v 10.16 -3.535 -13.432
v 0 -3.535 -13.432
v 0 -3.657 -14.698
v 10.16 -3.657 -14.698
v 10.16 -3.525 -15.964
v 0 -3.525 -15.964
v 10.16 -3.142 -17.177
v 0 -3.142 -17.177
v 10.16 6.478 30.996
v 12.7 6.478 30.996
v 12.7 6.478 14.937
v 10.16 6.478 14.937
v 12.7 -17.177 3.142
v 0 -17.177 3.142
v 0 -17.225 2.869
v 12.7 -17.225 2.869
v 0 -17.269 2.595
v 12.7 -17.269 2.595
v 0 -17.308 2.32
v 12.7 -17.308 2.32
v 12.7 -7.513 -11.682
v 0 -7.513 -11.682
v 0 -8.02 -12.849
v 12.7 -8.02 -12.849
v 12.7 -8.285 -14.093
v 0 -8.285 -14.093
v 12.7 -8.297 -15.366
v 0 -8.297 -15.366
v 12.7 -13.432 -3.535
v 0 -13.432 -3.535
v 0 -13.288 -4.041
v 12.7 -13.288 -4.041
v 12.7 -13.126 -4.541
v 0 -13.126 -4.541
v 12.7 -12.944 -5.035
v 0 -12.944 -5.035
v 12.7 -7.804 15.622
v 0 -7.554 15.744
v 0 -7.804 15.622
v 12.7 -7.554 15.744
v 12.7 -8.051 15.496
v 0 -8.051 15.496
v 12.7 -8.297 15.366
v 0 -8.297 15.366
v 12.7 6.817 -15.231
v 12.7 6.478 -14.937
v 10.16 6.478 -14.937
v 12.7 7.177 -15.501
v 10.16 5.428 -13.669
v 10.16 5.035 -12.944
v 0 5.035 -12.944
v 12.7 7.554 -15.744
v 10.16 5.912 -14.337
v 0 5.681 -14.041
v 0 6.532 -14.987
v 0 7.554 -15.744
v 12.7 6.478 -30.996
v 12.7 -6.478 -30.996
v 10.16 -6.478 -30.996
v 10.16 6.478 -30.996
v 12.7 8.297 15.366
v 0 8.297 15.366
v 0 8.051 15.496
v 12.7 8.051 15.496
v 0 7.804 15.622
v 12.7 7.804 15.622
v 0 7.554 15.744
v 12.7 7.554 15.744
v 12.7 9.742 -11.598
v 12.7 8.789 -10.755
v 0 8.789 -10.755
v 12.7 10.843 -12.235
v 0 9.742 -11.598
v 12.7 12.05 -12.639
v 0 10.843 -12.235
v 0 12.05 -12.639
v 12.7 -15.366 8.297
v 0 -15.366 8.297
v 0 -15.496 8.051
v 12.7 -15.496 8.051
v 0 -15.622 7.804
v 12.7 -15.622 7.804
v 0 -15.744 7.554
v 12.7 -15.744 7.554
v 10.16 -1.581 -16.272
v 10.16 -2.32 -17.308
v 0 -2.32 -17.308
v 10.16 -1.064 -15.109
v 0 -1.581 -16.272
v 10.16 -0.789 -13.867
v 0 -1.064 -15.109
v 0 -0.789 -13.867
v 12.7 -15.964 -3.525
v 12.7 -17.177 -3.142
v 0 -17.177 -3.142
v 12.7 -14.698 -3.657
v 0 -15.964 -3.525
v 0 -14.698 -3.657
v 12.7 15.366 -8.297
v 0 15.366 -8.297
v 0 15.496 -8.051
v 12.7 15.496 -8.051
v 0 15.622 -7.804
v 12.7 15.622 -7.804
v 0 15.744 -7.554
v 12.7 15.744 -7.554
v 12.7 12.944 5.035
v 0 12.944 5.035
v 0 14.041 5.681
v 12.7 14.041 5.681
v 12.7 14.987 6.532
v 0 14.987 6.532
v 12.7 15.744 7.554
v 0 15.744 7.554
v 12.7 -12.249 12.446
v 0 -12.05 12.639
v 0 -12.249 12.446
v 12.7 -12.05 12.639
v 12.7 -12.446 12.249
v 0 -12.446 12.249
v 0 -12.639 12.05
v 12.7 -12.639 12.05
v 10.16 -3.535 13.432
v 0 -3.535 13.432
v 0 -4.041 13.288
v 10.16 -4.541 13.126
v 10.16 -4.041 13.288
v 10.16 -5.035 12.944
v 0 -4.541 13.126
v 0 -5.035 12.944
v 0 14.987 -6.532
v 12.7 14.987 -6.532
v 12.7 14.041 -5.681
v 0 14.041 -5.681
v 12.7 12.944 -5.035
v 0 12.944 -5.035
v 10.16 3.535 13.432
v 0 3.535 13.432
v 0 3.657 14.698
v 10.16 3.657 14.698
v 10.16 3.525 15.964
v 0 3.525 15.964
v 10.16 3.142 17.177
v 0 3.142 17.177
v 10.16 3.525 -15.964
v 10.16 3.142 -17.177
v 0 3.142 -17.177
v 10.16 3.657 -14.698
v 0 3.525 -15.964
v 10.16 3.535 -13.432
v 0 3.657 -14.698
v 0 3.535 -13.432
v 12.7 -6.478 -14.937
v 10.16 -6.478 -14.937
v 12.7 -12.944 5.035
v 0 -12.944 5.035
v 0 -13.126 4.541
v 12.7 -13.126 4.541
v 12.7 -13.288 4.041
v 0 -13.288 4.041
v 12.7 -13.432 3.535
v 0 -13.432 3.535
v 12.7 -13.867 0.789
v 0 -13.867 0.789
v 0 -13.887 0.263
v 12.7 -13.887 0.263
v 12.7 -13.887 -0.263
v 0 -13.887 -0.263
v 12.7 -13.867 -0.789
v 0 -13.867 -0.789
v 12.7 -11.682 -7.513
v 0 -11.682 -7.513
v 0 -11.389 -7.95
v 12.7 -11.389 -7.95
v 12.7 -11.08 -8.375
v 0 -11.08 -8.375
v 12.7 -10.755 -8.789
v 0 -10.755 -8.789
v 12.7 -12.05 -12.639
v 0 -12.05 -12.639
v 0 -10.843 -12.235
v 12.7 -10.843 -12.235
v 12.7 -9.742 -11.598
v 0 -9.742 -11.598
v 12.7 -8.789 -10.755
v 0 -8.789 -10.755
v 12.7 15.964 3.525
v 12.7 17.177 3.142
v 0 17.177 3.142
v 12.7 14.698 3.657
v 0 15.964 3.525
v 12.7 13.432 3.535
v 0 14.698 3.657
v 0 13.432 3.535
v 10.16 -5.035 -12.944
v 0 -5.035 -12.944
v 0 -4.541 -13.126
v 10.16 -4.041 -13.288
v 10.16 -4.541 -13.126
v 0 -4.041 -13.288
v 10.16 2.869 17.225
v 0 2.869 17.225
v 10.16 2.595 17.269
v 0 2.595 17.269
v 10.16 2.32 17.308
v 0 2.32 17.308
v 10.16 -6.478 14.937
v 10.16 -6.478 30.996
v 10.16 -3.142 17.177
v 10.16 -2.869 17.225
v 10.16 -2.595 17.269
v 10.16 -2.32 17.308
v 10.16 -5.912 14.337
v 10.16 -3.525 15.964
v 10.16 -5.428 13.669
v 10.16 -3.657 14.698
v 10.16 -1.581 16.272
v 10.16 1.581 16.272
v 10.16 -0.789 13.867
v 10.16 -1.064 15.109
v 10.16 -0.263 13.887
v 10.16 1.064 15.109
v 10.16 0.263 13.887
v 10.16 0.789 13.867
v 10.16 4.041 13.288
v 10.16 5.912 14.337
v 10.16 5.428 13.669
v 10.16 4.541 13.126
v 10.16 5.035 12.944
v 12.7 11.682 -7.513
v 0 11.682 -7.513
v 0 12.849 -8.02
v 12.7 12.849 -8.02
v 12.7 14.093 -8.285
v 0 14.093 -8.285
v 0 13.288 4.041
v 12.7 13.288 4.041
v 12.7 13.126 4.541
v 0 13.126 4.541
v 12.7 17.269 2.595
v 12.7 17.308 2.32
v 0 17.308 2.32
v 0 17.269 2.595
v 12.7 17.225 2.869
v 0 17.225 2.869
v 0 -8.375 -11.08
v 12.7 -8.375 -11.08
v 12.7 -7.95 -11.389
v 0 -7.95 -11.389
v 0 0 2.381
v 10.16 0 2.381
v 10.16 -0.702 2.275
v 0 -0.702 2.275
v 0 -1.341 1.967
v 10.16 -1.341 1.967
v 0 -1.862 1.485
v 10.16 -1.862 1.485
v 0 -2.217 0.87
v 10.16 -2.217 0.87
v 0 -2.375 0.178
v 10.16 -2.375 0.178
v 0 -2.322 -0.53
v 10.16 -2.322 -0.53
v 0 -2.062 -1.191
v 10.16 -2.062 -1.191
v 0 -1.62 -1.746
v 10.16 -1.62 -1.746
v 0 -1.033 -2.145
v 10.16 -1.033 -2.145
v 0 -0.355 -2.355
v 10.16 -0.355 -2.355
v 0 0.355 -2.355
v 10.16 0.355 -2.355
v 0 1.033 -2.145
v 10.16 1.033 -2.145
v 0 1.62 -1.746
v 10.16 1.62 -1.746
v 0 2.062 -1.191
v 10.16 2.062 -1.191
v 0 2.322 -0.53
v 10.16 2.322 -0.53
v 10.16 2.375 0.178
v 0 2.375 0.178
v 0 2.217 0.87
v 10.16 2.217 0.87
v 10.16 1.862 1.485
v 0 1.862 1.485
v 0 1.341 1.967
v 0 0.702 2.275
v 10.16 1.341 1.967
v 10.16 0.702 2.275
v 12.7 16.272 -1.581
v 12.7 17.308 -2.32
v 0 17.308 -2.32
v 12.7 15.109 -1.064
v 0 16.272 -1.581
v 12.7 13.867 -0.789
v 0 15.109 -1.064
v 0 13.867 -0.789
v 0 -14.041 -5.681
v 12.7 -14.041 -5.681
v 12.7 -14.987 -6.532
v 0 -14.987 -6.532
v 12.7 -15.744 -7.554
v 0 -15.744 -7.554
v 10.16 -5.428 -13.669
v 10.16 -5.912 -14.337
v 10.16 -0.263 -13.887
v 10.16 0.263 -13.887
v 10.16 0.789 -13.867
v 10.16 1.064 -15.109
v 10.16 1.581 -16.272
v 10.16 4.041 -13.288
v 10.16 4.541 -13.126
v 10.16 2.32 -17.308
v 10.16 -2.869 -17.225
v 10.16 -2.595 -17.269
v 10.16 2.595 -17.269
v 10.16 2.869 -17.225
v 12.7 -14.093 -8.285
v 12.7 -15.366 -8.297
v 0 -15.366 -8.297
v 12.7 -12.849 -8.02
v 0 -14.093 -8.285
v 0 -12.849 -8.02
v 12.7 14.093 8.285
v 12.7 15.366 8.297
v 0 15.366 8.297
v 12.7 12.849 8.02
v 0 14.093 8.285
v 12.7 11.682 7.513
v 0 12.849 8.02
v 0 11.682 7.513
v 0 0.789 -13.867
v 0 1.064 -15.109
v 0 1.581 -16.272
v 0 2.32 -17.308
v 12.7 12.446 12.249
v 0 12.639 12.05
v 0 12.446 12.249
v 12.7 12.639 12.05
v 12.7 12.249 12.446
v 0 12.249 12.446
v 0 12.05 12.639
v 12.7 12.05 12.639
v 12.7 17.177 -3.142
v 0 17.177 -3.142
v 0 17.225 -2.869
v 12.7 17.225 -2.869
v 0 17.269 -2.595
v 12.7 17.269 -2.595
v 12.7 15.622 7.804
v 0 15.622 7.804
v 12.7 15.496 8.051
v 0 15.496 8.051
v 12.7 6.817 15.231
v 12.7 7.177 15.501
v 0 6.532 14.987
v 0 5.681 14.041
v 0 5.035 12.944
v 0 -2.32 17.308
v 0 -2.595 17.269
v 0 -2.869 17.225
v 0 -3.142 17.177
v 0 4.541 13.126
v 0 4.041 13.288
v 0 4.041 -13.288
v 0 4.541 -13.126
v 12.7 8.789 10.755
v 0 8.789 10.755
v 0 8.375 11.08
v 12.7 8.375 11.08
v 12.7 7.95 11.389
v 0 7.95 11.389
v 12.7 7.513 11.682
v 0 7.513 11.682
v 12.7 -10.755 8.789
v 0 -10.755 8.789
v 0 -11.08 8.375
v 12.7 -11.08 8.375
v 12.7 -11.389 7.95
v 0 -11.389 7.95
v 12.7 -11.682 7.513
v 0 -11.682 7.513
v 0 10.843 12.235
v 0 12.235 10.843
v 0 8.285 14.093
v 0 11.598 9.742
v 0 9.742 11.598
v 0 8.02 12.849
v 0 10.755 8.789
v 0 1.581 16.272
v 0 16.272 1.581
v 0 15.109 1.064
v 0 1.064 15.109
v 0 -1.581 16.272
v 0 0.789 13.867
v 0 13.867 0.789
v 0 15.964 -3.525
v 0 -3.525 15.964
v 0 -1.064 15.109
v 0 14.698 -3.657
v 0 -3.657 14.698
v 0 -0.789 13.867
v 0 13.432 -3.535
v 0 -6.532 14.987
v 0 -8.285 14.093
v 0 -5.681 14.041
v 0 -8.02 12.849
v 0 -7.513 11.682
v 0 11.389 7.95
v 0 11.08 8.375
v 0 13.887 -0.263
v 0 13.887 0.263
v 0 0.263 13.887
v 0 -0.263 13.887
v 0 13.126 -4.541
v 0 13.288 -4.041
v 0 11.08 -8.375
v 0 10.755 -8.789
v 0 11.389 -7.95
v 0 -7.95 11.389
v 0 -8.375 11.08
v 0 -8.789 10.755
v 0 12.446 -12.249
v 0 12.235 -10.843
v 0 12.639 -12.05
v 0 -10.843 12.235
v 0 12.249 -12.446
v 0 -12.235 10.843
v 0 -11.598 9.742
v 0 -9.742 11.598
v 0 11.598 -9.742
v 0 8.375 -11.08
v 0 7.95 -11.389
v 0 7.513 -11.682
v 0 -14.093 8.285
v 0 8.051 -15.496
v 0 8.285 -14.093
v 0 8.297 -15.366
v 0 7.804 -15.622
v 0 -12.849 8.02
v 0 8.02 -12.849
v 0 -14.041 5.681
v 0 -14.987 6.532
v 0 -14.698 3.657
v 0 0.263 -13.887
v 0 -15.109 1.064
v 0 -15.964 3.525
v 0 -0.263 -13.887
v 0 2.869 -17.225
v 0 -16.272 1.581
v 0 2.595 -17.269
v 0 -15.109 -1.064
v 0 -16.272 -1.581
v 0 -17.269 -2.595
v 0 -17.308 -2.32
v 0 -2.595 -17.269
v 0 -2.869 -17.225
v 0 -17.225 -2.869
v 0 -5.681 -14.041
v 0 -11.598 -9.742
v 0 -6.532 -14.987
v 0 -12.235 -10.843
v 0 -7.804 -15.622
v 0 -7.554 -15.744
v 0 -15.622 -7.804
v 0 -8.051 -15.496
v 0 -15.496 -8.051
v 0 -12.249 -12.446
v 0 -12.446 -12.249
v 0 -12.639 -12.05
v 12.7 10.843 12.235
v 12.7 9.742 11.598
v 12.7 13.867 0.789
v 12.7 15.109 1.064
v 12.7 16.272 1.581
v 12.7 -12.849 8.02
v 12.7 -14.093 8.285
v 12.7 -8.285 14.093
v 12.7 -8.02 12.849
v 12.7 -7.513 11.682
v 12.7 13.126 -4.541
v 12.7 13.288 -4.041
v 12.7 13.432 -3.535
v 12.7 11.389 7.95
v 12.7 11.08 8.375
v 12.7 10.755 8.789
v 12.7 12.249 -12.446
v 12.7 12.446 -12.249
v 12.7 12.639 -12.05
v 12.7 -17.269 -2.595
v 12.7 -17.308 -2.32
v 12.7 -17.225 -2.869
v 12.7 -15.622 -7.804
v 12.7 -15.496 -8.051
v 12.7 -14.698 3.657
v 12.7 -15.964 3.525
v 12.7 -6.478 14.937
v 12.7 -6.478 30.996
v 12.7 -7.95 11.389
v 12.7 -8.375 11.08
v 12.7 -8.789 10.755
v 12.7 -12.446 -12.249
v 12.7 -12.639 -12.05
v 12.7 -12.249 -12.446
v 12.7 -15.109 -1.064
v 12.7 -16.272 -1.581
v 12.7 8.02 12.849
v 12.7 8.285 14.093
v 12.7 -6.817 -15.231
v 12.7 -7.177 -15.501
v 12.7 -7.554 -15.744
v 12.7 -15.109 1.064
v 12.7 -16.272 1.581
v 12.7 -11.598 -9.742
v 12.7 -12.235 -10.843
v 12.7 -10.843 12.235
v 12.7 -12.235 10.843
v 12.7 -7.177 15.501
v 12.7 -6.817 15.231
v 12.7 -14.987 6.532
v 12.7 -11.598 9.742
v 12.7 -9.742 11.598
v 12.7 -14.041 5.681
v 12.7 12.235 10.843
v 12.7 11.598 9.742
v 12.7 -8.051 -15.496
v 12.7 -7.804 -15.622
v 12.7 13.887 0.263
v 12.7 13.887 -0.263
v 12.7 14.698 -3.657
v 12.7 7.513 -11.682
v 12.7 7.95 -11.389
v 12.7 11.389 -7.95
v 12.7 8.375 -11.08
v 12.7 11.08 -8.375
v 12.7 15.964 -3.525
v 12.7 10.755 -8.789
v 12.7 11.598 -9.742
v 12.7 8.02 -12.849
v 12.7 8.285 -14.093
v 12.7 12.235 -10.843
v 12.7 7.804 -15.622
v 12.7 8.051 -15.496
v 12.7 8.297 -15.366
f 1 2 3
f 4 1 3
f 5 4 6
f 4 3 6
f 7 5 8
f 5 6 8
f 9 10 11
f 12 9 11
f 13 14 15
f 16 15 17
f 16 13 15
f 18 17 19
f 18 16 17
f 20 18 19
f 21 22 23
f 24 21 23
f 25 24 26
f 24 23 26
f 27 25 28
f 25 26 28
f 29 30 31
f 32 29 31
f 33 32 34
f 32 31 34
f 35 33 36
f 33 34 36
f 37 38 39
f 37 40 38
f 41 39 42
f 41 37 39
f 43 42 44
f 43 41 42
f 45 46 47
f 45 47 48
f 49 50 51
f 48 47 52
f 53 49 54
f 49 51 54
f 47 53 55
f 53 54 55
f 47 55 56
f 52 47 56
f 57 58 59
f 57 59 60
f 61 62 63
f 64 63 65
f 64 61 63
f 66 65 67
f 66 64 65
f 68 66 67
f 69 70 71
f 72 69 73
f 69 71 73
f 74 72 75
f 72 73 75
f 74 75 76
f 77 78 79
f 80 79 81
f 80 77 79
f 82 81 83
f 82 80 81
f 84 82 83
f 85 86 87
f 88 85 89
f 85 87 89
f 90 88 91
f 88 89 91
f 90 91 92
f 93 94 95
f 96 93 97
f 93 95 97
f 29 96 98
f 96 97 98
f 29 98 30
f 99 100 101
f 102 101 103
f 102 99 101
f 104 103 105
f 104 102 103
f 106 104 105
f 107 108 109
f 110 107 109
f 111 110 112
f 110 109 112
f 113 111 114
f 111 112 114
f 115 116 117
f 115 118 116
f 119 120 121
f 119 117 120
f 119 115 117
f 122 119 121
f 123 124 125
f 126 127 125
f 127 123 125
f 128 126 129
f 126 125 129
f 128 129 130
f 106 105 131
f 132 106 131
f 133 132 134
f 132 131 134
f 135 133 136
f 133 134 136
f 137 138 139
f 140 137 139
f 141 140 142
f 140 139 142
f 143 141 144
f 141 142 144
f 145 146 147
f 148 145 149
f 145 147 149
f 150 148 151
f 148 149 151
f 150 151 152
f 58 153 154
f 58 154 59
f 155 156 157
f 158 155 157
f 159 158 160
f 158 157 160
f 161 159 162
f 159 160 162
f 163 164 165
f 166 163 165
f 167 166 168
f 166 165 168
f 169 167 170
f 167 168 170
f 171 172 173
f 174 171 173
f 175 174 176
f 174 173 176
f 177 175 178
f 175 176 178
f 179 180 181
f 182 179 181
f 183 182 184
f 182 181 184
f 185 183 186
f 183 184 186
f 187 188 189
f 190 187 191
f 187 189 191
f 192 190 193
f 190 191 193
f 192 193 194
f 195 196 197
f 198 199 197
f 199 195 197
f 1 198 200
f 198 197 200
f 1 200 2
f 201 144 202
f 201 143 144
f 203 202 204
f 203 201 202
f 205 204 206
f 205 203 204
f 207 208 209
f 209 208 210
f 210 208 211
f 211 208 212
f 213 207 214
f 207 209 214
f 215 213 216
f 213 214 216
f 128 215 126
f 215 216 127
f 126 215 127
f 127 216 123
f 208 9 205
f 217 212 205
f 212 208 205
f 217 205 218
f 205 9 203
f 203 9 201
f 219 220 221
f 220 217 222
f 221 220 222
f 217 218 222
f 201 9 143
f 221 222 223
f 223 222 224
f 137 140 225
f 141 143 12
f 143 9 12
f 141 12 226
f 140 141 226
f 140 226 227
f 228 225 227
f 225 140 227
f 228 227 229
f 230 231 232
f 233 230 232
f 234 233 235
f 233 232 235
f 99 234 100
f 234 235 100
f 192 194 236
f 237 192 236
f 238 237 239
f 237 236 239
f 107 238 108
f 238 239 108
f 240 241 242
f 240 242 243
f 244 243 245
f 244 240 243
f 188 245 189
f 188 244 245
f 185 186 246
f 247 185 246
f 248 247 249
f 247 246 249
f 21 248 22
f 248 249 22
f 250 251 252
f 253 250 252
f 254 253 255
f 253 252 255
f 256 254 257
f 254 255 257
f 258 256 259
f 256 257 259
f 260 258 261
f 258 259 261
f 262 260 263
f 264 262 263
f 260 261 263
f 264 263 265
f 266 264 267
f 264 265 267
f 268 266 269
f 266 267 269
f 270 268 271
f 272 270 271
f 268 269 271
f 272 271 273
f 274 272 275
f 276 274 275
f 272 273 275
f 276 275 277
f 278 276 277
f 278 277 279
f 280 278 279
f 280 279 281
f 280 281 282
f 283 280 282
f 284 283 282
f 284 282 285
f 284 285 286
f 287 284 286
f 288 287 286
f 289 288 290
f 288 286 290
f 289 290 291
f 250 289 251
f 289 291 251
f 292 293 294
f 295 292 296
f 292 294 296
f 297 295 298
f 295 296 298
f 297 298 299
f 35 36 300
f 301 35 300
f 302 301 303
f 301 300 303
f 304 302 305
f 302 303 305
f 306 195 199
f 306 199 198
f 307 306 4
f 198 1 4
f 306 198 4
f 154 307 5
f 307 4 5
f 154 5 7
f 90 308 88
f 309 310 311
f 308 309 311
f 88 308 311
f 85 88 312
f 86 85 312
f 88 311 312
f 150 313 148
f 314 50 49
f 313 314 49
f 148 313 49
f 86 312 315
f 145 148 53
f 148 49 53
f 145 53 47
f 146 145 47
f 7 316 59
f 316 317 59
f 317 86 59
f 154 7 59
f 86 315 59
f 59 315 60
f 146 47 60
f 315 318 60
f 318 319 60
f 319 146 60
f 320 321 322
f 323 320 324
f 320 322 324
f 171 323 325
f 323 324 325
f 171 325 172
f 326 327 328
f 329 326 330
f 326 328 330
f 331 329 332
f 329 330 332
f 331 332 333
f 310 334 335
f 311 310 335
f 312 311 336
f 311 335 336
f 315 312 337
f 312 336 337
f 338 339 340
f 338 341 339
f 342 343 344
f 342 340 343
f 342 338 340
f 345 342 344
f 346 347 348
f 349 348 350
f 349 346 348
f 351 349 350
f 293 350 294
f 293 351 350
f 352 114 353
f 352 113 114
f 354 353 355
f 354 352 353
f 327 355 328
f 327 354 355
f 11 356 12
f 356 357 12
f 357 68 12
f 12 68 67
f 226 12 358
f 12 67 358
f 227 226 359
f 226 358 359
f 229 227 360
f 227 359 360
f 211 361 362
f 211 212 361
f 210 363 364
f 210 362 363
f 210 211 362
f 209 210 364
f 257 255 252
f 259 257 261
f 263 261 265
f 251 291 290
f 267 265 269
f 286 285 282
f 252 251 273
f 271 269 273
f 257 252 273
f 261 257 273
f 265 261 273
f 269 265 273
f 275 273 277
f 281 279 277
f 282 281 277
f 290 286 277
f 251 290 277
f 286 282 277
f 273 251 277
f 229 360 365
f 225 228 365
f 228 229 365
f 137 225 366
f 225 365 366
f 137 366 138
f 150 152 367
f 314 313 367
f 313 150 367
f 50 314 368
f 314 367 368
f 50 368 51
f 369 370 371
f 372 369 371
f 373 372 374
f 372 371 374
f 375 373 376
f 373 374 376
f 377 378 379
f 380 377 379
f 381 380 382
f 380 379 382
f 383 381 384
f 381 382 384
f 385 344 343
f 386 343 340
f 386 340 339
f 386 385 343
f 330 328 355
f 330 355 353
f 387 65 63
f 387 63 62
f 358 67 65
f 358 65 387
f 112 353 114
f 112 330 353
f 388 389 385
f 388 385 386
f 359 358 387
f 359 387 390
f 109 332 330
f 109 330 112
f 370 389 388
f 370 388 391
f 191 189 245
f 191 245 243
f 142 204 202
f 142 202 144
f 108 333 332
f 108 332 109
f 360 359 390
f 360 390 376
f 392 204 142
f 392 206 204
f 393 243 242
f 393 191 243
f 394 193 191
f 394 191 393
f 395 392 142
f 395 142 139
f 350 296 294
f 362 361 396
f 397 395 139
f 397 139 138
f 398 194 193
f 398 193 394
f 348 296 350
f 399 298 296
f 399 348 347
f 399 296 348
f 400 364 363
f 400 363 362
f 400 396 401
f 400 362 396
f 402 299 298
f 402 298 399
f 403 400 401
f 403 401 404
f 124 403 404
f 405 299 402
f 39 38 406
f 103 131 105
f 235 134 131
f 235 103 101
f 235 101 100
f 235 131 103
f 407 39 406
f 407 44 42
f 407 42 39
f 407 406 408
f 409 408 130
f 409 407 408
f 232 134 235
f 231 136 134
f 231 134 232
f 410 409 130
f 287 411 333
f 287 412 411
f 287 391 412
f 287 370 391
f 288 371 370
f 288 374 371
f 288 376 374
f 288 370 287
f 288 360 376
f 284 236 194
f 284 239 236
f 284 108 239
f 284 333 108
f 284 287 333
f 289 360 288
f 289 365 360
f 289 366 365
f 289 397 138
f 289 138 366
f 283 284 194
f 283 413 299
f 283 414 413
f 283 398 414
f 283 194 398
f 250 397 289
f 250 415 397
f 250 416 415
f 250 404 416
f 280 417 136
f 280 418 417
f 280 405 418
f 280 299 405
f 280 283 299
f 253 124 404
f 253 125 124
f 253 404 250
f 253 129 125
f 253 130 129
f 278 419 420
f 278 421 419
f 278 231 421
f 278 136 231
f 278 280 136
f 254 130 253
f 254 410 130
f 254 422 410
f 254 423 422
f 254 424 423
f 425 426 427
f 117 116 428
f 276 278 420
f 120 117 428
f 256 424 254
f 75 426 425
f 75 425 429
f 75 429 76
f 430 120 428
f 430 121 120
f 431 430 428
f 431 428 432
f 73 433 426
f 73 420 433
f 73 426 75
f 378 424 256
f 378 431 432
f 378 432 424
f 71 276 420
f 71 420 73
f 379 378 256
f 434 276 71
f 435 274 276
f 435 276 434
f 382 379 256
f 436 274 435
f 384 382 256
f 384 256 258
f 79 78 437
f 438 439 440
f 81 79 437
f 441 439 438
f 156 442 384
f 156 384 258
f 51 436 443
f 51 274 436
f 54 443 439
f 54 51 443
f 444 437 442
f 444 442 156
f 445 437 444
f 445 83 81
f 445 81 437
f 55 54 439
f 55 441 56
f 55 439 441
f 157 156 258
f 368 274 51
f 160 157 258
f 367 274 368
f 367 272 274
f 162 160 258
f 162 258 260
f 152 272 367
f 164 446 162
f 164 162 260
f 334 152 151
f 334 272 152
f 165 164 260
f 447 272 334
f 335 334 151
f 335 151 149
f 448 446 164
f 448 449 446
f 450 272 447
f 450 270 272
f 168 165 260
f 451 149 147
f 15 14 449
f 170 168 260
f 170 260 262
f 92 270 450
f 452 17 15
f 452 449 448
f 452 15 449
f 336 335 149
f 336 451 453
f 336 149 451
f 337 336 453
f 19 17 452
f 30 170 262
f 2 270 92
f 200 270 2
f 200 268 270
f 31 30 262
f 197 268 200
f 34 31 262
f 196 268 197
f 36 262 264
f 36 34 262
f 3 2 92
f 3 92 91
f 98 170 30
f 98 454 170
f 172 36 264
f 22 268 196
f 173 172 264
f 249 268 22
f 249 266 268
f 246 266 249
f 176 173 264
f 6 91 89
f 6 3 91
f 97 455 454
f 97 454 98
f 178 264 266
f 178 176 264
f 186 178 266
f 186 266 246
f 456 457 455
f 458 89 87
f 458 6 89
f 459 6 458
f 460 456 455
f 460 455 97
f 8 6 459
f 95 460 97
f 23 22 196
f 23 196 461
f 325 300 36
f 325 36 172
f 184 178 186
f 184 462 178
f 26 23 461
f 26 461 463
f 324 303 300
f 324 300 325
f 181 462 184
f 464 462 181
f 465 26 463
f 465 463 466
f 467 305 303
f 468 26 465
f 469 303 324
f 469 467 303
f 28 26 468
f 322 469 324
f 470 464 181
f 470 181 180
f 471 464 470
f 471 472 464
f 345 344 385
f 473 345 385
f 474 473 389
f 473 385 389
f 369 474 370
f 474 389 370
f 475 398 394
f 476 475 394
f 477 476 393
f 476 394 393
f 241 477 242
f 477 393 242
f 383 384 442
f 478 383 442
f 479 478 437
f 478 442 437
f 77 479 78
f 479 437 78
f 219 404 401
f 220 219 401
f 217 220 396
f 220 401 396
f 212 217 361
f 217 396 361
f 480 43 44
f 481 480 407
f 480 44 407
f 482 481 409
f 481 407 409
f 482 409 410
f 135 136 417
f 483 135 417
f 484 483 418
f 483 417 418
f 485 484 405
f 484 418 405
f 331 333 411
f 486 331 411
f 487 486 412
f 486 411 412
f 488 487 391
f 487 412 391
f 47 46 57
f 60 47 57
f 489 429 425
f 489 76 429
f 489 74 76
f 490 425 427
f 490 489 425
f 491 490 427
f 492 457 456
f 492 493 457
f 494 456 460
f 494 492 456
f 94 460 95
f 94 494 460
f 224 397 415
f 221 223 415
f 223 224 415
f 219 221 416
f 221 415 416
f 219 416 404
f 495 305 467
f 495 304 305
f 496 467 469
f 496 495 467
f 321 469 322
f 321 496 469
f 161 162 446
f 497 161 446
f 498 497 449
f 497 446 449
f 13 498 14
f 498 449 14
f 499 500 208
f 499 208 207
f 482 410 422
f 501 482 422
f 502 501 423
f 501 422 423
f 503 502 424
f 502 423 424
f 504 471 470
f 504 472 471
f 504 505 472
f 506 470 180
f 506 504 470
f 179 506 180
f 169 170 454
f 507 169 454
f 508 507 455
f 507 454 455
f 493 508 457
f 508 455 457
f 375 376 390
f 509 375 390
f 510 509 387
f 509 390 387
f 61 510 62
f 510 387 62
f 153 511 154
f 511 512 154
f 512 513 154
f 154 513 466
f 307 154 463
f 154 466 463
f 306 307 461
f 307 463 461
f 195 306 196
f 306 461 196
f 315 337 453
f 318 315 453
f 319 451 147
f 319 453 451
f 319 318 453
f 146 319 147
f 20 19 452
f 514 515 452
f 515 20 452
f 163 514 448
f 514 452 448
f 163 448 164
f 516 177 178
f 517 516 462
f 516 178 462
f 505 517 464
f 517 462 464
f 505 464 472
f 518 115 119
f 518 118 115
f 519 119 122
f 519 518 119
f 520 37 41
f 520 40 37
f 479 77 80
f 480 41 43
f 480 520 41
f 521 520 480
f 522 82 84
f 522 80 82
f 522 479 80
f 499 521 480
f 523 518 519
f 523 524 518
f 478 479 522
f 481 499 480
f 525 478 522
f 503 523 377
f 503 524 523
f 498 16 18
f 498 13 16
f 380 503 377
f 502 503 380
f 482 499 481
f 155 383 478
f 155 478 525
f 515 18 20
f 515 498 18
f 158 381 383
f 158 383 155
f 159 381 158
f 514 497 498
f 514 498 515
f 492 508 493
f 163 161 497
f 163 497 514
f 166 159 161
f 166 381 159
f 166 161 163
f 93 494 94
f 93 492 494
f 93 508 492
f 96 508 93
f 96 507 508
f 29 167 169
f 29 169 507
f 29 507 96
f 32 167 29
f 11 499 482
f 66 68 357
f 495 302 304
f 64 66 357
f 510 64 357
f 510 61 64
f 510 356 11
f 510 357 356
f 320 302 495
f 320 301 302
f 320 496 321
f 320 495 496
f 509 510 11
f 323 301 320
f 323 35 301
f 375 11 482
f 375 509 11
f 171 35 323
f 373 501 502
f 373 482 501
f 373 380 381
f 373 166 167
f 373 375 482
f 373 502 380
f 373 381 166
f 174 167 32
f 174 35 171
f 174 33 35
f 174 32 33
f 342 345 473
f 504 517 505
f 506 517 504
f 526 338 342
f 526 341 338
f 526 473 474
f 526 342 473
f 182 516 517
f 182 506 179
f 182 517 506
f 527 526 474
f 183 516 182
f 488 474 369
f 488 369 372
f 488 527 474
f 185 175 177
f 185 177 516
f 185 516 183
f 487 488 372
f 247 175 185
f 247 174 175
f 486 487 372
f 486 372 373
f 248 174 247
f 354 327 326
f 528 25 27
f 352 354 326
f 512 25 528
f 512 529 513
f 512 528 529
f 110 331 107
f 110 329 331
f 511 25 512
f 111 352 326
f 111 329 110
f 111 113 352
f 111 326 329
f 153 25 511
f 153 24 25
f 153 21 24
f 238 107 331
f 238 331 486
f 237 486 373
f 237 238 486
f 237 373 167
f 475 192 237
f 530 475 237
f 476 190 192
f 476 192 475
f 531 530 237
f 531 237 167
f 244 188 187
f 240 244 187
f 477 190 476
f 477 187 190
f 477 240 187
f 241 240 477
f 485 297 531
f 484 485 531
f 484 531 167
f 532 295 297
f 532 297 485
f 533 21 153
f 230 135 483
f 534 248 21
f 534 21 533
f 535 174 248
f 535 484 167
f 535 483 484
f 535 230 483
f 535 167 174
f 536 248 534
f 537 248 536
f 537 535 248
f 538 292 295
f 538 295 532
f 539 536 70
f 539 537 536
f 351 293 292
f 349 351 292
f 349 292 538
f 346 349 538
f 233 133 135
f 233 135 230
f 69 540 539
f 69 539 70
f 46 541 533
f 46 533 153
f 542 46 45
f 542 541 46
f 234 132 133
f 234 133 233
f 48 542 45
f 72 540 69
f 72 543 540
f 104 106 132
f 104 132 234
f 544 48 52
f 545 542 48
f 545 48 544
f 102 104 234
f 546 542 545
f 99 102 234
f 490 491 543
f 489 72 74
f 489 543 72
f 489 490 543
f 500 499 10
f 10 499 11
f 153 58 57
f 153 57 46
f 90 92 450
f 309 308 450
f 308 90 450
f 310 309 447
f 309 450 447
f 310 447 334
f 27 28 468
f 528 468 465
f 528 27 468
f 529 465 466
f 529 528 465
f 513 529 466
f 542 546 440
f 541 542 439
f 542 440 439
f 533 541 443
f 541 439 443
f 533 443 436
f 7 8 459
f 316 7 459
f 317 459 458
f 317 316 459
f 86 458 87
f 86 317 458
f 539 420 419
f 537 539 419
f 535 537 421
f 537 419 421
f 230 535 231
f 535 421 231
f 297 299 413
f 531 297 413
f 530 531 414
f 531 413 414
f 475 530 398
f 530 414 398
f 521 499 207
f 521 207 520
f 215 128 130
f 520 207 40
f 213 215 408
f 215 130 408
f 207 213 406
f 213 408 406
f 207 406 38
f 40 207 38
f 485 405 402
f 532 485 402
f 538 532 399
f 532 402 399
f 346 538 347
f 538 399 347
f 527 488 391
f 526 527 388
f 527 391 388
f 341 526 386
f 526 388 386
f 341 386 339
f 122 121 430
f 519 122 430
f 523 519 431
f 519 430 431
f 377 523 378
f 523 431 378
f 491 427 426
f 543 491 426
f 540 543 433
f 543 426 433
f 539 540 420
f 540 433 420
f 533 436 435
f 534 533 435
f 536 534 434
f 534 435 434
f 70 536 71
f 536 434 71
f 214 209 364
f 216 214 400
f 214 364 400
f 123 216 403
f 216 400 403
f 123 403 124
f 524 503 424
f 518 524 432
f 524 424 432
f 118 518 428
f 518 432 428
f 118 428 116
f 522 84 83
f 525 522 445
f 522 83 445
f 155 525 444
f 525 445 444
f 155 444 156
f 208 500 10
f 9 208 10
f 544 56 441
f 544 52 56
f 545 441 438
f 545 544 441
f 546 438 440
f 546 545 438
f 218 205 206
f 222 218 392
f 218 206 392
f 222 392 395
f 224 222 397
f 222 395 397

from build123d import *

# Parameters (mm, degrees)
BASPROSKE_W         = 12.7
BASPROSKE_H         = 17.4625
TOOTHCUT_DEPTH      = 28.769908399
TEETHCUTS_COUNT     = 20
TEETHCUTS_ANGLE     = 342
BORSKE_R            = 2.38125
BORE_DEPTH          = 50.8000508
SKETCH1_W           = 61.991981732
SKETCH1_H           = 12.955644482
BOSS_EXTRUDE1_DEPTH = 2.54


with BuildPart() as part:
    # BasProSke → Base-Revolve (revolve)
    with BuildSketch(Plane(origin=(0, 0, 0), x_dir=(1, 0, 0), z_dir=(0, 1, 0)), mode=Mode.PRIVATE) as base_revolve_sk:
        with Locations((6.35, 8.73125)):
            Rectangle(BASPROSKE_W, BASPROSKE_H)
    revolve(base_revolve_sk.sketch.rotate(Axis((-10, 0, 0), (1, 0, 0)), 180), axis=Axis((-10, 0, 0), (1, 0, 0)))

    # TooCutSke → ToothCut (cut, through all)
    with BuildSketch(Plane(origin=(0, 0, 0), x_dir=(0, 0, -1), z_dir=(1, 0, 0))):
        with BuildLine():
            ThreePointArc((0.788800759, 13.866938223), (0, 13.889355), (-0.788800759, 13.866938223))
            ThreePointArc((-0.788800759, 13.866938223), (-1.299448137, 15.717380814), (-2.339725589, 17.330675999))
            ThreePointArc((-2.339725589, 17.330675999), (0, 17.4879), (2.339725589, 17.330675999))
            ThreePointArc((2.339725589, 17.330675999), (1.299448137, 15.717380814), (0.788800759, 13.866938223))
        make_face()
    toothcut = extrude(amount=TOOTHCUT_DEPTH, mode=Mode.SUBTRACT)

    # TeethCuts: ToothCut ×20 about axis
    teethcuts_axis = Axis((-10, 0, 0), (1, 0, 0))
    for i in range(1, TEETHCUTS_COUNT):
        add(toothcut.rotate(teethcuts_axis, i * TEETHCUTS_ANGLE / (TEETHCUTS_COUNT - 1)), mode=Mode.SUBTRACT)

    # BorSke → Bore (cut, symmetric)
    with BuildSketch(Plane(origin=(0, 0, 0), x_dir=(0, 0, -1), z_dir=(1, 0, 0))):
        with Locations(Location((0, 0, 0), (0, 0, 180))):
            Circle(BORSKE_R)
    extrude(amount=BORE_DEPTH, both=True, mode=Mode.SUBTRACT)

    # Sketch1 → Boss-Extrude1 (add)
    with BuildSketch(Plane(origin=(12.7, 0, 0), x_dir=(0, 0, -1), z_dir=(1, 0, 0))):
        Rectangle(SKETCH1_W, SKETCH1_H)
    extrude(amount=-BOSS_EXTRUDE1_DEPTH)


solid = part.part
